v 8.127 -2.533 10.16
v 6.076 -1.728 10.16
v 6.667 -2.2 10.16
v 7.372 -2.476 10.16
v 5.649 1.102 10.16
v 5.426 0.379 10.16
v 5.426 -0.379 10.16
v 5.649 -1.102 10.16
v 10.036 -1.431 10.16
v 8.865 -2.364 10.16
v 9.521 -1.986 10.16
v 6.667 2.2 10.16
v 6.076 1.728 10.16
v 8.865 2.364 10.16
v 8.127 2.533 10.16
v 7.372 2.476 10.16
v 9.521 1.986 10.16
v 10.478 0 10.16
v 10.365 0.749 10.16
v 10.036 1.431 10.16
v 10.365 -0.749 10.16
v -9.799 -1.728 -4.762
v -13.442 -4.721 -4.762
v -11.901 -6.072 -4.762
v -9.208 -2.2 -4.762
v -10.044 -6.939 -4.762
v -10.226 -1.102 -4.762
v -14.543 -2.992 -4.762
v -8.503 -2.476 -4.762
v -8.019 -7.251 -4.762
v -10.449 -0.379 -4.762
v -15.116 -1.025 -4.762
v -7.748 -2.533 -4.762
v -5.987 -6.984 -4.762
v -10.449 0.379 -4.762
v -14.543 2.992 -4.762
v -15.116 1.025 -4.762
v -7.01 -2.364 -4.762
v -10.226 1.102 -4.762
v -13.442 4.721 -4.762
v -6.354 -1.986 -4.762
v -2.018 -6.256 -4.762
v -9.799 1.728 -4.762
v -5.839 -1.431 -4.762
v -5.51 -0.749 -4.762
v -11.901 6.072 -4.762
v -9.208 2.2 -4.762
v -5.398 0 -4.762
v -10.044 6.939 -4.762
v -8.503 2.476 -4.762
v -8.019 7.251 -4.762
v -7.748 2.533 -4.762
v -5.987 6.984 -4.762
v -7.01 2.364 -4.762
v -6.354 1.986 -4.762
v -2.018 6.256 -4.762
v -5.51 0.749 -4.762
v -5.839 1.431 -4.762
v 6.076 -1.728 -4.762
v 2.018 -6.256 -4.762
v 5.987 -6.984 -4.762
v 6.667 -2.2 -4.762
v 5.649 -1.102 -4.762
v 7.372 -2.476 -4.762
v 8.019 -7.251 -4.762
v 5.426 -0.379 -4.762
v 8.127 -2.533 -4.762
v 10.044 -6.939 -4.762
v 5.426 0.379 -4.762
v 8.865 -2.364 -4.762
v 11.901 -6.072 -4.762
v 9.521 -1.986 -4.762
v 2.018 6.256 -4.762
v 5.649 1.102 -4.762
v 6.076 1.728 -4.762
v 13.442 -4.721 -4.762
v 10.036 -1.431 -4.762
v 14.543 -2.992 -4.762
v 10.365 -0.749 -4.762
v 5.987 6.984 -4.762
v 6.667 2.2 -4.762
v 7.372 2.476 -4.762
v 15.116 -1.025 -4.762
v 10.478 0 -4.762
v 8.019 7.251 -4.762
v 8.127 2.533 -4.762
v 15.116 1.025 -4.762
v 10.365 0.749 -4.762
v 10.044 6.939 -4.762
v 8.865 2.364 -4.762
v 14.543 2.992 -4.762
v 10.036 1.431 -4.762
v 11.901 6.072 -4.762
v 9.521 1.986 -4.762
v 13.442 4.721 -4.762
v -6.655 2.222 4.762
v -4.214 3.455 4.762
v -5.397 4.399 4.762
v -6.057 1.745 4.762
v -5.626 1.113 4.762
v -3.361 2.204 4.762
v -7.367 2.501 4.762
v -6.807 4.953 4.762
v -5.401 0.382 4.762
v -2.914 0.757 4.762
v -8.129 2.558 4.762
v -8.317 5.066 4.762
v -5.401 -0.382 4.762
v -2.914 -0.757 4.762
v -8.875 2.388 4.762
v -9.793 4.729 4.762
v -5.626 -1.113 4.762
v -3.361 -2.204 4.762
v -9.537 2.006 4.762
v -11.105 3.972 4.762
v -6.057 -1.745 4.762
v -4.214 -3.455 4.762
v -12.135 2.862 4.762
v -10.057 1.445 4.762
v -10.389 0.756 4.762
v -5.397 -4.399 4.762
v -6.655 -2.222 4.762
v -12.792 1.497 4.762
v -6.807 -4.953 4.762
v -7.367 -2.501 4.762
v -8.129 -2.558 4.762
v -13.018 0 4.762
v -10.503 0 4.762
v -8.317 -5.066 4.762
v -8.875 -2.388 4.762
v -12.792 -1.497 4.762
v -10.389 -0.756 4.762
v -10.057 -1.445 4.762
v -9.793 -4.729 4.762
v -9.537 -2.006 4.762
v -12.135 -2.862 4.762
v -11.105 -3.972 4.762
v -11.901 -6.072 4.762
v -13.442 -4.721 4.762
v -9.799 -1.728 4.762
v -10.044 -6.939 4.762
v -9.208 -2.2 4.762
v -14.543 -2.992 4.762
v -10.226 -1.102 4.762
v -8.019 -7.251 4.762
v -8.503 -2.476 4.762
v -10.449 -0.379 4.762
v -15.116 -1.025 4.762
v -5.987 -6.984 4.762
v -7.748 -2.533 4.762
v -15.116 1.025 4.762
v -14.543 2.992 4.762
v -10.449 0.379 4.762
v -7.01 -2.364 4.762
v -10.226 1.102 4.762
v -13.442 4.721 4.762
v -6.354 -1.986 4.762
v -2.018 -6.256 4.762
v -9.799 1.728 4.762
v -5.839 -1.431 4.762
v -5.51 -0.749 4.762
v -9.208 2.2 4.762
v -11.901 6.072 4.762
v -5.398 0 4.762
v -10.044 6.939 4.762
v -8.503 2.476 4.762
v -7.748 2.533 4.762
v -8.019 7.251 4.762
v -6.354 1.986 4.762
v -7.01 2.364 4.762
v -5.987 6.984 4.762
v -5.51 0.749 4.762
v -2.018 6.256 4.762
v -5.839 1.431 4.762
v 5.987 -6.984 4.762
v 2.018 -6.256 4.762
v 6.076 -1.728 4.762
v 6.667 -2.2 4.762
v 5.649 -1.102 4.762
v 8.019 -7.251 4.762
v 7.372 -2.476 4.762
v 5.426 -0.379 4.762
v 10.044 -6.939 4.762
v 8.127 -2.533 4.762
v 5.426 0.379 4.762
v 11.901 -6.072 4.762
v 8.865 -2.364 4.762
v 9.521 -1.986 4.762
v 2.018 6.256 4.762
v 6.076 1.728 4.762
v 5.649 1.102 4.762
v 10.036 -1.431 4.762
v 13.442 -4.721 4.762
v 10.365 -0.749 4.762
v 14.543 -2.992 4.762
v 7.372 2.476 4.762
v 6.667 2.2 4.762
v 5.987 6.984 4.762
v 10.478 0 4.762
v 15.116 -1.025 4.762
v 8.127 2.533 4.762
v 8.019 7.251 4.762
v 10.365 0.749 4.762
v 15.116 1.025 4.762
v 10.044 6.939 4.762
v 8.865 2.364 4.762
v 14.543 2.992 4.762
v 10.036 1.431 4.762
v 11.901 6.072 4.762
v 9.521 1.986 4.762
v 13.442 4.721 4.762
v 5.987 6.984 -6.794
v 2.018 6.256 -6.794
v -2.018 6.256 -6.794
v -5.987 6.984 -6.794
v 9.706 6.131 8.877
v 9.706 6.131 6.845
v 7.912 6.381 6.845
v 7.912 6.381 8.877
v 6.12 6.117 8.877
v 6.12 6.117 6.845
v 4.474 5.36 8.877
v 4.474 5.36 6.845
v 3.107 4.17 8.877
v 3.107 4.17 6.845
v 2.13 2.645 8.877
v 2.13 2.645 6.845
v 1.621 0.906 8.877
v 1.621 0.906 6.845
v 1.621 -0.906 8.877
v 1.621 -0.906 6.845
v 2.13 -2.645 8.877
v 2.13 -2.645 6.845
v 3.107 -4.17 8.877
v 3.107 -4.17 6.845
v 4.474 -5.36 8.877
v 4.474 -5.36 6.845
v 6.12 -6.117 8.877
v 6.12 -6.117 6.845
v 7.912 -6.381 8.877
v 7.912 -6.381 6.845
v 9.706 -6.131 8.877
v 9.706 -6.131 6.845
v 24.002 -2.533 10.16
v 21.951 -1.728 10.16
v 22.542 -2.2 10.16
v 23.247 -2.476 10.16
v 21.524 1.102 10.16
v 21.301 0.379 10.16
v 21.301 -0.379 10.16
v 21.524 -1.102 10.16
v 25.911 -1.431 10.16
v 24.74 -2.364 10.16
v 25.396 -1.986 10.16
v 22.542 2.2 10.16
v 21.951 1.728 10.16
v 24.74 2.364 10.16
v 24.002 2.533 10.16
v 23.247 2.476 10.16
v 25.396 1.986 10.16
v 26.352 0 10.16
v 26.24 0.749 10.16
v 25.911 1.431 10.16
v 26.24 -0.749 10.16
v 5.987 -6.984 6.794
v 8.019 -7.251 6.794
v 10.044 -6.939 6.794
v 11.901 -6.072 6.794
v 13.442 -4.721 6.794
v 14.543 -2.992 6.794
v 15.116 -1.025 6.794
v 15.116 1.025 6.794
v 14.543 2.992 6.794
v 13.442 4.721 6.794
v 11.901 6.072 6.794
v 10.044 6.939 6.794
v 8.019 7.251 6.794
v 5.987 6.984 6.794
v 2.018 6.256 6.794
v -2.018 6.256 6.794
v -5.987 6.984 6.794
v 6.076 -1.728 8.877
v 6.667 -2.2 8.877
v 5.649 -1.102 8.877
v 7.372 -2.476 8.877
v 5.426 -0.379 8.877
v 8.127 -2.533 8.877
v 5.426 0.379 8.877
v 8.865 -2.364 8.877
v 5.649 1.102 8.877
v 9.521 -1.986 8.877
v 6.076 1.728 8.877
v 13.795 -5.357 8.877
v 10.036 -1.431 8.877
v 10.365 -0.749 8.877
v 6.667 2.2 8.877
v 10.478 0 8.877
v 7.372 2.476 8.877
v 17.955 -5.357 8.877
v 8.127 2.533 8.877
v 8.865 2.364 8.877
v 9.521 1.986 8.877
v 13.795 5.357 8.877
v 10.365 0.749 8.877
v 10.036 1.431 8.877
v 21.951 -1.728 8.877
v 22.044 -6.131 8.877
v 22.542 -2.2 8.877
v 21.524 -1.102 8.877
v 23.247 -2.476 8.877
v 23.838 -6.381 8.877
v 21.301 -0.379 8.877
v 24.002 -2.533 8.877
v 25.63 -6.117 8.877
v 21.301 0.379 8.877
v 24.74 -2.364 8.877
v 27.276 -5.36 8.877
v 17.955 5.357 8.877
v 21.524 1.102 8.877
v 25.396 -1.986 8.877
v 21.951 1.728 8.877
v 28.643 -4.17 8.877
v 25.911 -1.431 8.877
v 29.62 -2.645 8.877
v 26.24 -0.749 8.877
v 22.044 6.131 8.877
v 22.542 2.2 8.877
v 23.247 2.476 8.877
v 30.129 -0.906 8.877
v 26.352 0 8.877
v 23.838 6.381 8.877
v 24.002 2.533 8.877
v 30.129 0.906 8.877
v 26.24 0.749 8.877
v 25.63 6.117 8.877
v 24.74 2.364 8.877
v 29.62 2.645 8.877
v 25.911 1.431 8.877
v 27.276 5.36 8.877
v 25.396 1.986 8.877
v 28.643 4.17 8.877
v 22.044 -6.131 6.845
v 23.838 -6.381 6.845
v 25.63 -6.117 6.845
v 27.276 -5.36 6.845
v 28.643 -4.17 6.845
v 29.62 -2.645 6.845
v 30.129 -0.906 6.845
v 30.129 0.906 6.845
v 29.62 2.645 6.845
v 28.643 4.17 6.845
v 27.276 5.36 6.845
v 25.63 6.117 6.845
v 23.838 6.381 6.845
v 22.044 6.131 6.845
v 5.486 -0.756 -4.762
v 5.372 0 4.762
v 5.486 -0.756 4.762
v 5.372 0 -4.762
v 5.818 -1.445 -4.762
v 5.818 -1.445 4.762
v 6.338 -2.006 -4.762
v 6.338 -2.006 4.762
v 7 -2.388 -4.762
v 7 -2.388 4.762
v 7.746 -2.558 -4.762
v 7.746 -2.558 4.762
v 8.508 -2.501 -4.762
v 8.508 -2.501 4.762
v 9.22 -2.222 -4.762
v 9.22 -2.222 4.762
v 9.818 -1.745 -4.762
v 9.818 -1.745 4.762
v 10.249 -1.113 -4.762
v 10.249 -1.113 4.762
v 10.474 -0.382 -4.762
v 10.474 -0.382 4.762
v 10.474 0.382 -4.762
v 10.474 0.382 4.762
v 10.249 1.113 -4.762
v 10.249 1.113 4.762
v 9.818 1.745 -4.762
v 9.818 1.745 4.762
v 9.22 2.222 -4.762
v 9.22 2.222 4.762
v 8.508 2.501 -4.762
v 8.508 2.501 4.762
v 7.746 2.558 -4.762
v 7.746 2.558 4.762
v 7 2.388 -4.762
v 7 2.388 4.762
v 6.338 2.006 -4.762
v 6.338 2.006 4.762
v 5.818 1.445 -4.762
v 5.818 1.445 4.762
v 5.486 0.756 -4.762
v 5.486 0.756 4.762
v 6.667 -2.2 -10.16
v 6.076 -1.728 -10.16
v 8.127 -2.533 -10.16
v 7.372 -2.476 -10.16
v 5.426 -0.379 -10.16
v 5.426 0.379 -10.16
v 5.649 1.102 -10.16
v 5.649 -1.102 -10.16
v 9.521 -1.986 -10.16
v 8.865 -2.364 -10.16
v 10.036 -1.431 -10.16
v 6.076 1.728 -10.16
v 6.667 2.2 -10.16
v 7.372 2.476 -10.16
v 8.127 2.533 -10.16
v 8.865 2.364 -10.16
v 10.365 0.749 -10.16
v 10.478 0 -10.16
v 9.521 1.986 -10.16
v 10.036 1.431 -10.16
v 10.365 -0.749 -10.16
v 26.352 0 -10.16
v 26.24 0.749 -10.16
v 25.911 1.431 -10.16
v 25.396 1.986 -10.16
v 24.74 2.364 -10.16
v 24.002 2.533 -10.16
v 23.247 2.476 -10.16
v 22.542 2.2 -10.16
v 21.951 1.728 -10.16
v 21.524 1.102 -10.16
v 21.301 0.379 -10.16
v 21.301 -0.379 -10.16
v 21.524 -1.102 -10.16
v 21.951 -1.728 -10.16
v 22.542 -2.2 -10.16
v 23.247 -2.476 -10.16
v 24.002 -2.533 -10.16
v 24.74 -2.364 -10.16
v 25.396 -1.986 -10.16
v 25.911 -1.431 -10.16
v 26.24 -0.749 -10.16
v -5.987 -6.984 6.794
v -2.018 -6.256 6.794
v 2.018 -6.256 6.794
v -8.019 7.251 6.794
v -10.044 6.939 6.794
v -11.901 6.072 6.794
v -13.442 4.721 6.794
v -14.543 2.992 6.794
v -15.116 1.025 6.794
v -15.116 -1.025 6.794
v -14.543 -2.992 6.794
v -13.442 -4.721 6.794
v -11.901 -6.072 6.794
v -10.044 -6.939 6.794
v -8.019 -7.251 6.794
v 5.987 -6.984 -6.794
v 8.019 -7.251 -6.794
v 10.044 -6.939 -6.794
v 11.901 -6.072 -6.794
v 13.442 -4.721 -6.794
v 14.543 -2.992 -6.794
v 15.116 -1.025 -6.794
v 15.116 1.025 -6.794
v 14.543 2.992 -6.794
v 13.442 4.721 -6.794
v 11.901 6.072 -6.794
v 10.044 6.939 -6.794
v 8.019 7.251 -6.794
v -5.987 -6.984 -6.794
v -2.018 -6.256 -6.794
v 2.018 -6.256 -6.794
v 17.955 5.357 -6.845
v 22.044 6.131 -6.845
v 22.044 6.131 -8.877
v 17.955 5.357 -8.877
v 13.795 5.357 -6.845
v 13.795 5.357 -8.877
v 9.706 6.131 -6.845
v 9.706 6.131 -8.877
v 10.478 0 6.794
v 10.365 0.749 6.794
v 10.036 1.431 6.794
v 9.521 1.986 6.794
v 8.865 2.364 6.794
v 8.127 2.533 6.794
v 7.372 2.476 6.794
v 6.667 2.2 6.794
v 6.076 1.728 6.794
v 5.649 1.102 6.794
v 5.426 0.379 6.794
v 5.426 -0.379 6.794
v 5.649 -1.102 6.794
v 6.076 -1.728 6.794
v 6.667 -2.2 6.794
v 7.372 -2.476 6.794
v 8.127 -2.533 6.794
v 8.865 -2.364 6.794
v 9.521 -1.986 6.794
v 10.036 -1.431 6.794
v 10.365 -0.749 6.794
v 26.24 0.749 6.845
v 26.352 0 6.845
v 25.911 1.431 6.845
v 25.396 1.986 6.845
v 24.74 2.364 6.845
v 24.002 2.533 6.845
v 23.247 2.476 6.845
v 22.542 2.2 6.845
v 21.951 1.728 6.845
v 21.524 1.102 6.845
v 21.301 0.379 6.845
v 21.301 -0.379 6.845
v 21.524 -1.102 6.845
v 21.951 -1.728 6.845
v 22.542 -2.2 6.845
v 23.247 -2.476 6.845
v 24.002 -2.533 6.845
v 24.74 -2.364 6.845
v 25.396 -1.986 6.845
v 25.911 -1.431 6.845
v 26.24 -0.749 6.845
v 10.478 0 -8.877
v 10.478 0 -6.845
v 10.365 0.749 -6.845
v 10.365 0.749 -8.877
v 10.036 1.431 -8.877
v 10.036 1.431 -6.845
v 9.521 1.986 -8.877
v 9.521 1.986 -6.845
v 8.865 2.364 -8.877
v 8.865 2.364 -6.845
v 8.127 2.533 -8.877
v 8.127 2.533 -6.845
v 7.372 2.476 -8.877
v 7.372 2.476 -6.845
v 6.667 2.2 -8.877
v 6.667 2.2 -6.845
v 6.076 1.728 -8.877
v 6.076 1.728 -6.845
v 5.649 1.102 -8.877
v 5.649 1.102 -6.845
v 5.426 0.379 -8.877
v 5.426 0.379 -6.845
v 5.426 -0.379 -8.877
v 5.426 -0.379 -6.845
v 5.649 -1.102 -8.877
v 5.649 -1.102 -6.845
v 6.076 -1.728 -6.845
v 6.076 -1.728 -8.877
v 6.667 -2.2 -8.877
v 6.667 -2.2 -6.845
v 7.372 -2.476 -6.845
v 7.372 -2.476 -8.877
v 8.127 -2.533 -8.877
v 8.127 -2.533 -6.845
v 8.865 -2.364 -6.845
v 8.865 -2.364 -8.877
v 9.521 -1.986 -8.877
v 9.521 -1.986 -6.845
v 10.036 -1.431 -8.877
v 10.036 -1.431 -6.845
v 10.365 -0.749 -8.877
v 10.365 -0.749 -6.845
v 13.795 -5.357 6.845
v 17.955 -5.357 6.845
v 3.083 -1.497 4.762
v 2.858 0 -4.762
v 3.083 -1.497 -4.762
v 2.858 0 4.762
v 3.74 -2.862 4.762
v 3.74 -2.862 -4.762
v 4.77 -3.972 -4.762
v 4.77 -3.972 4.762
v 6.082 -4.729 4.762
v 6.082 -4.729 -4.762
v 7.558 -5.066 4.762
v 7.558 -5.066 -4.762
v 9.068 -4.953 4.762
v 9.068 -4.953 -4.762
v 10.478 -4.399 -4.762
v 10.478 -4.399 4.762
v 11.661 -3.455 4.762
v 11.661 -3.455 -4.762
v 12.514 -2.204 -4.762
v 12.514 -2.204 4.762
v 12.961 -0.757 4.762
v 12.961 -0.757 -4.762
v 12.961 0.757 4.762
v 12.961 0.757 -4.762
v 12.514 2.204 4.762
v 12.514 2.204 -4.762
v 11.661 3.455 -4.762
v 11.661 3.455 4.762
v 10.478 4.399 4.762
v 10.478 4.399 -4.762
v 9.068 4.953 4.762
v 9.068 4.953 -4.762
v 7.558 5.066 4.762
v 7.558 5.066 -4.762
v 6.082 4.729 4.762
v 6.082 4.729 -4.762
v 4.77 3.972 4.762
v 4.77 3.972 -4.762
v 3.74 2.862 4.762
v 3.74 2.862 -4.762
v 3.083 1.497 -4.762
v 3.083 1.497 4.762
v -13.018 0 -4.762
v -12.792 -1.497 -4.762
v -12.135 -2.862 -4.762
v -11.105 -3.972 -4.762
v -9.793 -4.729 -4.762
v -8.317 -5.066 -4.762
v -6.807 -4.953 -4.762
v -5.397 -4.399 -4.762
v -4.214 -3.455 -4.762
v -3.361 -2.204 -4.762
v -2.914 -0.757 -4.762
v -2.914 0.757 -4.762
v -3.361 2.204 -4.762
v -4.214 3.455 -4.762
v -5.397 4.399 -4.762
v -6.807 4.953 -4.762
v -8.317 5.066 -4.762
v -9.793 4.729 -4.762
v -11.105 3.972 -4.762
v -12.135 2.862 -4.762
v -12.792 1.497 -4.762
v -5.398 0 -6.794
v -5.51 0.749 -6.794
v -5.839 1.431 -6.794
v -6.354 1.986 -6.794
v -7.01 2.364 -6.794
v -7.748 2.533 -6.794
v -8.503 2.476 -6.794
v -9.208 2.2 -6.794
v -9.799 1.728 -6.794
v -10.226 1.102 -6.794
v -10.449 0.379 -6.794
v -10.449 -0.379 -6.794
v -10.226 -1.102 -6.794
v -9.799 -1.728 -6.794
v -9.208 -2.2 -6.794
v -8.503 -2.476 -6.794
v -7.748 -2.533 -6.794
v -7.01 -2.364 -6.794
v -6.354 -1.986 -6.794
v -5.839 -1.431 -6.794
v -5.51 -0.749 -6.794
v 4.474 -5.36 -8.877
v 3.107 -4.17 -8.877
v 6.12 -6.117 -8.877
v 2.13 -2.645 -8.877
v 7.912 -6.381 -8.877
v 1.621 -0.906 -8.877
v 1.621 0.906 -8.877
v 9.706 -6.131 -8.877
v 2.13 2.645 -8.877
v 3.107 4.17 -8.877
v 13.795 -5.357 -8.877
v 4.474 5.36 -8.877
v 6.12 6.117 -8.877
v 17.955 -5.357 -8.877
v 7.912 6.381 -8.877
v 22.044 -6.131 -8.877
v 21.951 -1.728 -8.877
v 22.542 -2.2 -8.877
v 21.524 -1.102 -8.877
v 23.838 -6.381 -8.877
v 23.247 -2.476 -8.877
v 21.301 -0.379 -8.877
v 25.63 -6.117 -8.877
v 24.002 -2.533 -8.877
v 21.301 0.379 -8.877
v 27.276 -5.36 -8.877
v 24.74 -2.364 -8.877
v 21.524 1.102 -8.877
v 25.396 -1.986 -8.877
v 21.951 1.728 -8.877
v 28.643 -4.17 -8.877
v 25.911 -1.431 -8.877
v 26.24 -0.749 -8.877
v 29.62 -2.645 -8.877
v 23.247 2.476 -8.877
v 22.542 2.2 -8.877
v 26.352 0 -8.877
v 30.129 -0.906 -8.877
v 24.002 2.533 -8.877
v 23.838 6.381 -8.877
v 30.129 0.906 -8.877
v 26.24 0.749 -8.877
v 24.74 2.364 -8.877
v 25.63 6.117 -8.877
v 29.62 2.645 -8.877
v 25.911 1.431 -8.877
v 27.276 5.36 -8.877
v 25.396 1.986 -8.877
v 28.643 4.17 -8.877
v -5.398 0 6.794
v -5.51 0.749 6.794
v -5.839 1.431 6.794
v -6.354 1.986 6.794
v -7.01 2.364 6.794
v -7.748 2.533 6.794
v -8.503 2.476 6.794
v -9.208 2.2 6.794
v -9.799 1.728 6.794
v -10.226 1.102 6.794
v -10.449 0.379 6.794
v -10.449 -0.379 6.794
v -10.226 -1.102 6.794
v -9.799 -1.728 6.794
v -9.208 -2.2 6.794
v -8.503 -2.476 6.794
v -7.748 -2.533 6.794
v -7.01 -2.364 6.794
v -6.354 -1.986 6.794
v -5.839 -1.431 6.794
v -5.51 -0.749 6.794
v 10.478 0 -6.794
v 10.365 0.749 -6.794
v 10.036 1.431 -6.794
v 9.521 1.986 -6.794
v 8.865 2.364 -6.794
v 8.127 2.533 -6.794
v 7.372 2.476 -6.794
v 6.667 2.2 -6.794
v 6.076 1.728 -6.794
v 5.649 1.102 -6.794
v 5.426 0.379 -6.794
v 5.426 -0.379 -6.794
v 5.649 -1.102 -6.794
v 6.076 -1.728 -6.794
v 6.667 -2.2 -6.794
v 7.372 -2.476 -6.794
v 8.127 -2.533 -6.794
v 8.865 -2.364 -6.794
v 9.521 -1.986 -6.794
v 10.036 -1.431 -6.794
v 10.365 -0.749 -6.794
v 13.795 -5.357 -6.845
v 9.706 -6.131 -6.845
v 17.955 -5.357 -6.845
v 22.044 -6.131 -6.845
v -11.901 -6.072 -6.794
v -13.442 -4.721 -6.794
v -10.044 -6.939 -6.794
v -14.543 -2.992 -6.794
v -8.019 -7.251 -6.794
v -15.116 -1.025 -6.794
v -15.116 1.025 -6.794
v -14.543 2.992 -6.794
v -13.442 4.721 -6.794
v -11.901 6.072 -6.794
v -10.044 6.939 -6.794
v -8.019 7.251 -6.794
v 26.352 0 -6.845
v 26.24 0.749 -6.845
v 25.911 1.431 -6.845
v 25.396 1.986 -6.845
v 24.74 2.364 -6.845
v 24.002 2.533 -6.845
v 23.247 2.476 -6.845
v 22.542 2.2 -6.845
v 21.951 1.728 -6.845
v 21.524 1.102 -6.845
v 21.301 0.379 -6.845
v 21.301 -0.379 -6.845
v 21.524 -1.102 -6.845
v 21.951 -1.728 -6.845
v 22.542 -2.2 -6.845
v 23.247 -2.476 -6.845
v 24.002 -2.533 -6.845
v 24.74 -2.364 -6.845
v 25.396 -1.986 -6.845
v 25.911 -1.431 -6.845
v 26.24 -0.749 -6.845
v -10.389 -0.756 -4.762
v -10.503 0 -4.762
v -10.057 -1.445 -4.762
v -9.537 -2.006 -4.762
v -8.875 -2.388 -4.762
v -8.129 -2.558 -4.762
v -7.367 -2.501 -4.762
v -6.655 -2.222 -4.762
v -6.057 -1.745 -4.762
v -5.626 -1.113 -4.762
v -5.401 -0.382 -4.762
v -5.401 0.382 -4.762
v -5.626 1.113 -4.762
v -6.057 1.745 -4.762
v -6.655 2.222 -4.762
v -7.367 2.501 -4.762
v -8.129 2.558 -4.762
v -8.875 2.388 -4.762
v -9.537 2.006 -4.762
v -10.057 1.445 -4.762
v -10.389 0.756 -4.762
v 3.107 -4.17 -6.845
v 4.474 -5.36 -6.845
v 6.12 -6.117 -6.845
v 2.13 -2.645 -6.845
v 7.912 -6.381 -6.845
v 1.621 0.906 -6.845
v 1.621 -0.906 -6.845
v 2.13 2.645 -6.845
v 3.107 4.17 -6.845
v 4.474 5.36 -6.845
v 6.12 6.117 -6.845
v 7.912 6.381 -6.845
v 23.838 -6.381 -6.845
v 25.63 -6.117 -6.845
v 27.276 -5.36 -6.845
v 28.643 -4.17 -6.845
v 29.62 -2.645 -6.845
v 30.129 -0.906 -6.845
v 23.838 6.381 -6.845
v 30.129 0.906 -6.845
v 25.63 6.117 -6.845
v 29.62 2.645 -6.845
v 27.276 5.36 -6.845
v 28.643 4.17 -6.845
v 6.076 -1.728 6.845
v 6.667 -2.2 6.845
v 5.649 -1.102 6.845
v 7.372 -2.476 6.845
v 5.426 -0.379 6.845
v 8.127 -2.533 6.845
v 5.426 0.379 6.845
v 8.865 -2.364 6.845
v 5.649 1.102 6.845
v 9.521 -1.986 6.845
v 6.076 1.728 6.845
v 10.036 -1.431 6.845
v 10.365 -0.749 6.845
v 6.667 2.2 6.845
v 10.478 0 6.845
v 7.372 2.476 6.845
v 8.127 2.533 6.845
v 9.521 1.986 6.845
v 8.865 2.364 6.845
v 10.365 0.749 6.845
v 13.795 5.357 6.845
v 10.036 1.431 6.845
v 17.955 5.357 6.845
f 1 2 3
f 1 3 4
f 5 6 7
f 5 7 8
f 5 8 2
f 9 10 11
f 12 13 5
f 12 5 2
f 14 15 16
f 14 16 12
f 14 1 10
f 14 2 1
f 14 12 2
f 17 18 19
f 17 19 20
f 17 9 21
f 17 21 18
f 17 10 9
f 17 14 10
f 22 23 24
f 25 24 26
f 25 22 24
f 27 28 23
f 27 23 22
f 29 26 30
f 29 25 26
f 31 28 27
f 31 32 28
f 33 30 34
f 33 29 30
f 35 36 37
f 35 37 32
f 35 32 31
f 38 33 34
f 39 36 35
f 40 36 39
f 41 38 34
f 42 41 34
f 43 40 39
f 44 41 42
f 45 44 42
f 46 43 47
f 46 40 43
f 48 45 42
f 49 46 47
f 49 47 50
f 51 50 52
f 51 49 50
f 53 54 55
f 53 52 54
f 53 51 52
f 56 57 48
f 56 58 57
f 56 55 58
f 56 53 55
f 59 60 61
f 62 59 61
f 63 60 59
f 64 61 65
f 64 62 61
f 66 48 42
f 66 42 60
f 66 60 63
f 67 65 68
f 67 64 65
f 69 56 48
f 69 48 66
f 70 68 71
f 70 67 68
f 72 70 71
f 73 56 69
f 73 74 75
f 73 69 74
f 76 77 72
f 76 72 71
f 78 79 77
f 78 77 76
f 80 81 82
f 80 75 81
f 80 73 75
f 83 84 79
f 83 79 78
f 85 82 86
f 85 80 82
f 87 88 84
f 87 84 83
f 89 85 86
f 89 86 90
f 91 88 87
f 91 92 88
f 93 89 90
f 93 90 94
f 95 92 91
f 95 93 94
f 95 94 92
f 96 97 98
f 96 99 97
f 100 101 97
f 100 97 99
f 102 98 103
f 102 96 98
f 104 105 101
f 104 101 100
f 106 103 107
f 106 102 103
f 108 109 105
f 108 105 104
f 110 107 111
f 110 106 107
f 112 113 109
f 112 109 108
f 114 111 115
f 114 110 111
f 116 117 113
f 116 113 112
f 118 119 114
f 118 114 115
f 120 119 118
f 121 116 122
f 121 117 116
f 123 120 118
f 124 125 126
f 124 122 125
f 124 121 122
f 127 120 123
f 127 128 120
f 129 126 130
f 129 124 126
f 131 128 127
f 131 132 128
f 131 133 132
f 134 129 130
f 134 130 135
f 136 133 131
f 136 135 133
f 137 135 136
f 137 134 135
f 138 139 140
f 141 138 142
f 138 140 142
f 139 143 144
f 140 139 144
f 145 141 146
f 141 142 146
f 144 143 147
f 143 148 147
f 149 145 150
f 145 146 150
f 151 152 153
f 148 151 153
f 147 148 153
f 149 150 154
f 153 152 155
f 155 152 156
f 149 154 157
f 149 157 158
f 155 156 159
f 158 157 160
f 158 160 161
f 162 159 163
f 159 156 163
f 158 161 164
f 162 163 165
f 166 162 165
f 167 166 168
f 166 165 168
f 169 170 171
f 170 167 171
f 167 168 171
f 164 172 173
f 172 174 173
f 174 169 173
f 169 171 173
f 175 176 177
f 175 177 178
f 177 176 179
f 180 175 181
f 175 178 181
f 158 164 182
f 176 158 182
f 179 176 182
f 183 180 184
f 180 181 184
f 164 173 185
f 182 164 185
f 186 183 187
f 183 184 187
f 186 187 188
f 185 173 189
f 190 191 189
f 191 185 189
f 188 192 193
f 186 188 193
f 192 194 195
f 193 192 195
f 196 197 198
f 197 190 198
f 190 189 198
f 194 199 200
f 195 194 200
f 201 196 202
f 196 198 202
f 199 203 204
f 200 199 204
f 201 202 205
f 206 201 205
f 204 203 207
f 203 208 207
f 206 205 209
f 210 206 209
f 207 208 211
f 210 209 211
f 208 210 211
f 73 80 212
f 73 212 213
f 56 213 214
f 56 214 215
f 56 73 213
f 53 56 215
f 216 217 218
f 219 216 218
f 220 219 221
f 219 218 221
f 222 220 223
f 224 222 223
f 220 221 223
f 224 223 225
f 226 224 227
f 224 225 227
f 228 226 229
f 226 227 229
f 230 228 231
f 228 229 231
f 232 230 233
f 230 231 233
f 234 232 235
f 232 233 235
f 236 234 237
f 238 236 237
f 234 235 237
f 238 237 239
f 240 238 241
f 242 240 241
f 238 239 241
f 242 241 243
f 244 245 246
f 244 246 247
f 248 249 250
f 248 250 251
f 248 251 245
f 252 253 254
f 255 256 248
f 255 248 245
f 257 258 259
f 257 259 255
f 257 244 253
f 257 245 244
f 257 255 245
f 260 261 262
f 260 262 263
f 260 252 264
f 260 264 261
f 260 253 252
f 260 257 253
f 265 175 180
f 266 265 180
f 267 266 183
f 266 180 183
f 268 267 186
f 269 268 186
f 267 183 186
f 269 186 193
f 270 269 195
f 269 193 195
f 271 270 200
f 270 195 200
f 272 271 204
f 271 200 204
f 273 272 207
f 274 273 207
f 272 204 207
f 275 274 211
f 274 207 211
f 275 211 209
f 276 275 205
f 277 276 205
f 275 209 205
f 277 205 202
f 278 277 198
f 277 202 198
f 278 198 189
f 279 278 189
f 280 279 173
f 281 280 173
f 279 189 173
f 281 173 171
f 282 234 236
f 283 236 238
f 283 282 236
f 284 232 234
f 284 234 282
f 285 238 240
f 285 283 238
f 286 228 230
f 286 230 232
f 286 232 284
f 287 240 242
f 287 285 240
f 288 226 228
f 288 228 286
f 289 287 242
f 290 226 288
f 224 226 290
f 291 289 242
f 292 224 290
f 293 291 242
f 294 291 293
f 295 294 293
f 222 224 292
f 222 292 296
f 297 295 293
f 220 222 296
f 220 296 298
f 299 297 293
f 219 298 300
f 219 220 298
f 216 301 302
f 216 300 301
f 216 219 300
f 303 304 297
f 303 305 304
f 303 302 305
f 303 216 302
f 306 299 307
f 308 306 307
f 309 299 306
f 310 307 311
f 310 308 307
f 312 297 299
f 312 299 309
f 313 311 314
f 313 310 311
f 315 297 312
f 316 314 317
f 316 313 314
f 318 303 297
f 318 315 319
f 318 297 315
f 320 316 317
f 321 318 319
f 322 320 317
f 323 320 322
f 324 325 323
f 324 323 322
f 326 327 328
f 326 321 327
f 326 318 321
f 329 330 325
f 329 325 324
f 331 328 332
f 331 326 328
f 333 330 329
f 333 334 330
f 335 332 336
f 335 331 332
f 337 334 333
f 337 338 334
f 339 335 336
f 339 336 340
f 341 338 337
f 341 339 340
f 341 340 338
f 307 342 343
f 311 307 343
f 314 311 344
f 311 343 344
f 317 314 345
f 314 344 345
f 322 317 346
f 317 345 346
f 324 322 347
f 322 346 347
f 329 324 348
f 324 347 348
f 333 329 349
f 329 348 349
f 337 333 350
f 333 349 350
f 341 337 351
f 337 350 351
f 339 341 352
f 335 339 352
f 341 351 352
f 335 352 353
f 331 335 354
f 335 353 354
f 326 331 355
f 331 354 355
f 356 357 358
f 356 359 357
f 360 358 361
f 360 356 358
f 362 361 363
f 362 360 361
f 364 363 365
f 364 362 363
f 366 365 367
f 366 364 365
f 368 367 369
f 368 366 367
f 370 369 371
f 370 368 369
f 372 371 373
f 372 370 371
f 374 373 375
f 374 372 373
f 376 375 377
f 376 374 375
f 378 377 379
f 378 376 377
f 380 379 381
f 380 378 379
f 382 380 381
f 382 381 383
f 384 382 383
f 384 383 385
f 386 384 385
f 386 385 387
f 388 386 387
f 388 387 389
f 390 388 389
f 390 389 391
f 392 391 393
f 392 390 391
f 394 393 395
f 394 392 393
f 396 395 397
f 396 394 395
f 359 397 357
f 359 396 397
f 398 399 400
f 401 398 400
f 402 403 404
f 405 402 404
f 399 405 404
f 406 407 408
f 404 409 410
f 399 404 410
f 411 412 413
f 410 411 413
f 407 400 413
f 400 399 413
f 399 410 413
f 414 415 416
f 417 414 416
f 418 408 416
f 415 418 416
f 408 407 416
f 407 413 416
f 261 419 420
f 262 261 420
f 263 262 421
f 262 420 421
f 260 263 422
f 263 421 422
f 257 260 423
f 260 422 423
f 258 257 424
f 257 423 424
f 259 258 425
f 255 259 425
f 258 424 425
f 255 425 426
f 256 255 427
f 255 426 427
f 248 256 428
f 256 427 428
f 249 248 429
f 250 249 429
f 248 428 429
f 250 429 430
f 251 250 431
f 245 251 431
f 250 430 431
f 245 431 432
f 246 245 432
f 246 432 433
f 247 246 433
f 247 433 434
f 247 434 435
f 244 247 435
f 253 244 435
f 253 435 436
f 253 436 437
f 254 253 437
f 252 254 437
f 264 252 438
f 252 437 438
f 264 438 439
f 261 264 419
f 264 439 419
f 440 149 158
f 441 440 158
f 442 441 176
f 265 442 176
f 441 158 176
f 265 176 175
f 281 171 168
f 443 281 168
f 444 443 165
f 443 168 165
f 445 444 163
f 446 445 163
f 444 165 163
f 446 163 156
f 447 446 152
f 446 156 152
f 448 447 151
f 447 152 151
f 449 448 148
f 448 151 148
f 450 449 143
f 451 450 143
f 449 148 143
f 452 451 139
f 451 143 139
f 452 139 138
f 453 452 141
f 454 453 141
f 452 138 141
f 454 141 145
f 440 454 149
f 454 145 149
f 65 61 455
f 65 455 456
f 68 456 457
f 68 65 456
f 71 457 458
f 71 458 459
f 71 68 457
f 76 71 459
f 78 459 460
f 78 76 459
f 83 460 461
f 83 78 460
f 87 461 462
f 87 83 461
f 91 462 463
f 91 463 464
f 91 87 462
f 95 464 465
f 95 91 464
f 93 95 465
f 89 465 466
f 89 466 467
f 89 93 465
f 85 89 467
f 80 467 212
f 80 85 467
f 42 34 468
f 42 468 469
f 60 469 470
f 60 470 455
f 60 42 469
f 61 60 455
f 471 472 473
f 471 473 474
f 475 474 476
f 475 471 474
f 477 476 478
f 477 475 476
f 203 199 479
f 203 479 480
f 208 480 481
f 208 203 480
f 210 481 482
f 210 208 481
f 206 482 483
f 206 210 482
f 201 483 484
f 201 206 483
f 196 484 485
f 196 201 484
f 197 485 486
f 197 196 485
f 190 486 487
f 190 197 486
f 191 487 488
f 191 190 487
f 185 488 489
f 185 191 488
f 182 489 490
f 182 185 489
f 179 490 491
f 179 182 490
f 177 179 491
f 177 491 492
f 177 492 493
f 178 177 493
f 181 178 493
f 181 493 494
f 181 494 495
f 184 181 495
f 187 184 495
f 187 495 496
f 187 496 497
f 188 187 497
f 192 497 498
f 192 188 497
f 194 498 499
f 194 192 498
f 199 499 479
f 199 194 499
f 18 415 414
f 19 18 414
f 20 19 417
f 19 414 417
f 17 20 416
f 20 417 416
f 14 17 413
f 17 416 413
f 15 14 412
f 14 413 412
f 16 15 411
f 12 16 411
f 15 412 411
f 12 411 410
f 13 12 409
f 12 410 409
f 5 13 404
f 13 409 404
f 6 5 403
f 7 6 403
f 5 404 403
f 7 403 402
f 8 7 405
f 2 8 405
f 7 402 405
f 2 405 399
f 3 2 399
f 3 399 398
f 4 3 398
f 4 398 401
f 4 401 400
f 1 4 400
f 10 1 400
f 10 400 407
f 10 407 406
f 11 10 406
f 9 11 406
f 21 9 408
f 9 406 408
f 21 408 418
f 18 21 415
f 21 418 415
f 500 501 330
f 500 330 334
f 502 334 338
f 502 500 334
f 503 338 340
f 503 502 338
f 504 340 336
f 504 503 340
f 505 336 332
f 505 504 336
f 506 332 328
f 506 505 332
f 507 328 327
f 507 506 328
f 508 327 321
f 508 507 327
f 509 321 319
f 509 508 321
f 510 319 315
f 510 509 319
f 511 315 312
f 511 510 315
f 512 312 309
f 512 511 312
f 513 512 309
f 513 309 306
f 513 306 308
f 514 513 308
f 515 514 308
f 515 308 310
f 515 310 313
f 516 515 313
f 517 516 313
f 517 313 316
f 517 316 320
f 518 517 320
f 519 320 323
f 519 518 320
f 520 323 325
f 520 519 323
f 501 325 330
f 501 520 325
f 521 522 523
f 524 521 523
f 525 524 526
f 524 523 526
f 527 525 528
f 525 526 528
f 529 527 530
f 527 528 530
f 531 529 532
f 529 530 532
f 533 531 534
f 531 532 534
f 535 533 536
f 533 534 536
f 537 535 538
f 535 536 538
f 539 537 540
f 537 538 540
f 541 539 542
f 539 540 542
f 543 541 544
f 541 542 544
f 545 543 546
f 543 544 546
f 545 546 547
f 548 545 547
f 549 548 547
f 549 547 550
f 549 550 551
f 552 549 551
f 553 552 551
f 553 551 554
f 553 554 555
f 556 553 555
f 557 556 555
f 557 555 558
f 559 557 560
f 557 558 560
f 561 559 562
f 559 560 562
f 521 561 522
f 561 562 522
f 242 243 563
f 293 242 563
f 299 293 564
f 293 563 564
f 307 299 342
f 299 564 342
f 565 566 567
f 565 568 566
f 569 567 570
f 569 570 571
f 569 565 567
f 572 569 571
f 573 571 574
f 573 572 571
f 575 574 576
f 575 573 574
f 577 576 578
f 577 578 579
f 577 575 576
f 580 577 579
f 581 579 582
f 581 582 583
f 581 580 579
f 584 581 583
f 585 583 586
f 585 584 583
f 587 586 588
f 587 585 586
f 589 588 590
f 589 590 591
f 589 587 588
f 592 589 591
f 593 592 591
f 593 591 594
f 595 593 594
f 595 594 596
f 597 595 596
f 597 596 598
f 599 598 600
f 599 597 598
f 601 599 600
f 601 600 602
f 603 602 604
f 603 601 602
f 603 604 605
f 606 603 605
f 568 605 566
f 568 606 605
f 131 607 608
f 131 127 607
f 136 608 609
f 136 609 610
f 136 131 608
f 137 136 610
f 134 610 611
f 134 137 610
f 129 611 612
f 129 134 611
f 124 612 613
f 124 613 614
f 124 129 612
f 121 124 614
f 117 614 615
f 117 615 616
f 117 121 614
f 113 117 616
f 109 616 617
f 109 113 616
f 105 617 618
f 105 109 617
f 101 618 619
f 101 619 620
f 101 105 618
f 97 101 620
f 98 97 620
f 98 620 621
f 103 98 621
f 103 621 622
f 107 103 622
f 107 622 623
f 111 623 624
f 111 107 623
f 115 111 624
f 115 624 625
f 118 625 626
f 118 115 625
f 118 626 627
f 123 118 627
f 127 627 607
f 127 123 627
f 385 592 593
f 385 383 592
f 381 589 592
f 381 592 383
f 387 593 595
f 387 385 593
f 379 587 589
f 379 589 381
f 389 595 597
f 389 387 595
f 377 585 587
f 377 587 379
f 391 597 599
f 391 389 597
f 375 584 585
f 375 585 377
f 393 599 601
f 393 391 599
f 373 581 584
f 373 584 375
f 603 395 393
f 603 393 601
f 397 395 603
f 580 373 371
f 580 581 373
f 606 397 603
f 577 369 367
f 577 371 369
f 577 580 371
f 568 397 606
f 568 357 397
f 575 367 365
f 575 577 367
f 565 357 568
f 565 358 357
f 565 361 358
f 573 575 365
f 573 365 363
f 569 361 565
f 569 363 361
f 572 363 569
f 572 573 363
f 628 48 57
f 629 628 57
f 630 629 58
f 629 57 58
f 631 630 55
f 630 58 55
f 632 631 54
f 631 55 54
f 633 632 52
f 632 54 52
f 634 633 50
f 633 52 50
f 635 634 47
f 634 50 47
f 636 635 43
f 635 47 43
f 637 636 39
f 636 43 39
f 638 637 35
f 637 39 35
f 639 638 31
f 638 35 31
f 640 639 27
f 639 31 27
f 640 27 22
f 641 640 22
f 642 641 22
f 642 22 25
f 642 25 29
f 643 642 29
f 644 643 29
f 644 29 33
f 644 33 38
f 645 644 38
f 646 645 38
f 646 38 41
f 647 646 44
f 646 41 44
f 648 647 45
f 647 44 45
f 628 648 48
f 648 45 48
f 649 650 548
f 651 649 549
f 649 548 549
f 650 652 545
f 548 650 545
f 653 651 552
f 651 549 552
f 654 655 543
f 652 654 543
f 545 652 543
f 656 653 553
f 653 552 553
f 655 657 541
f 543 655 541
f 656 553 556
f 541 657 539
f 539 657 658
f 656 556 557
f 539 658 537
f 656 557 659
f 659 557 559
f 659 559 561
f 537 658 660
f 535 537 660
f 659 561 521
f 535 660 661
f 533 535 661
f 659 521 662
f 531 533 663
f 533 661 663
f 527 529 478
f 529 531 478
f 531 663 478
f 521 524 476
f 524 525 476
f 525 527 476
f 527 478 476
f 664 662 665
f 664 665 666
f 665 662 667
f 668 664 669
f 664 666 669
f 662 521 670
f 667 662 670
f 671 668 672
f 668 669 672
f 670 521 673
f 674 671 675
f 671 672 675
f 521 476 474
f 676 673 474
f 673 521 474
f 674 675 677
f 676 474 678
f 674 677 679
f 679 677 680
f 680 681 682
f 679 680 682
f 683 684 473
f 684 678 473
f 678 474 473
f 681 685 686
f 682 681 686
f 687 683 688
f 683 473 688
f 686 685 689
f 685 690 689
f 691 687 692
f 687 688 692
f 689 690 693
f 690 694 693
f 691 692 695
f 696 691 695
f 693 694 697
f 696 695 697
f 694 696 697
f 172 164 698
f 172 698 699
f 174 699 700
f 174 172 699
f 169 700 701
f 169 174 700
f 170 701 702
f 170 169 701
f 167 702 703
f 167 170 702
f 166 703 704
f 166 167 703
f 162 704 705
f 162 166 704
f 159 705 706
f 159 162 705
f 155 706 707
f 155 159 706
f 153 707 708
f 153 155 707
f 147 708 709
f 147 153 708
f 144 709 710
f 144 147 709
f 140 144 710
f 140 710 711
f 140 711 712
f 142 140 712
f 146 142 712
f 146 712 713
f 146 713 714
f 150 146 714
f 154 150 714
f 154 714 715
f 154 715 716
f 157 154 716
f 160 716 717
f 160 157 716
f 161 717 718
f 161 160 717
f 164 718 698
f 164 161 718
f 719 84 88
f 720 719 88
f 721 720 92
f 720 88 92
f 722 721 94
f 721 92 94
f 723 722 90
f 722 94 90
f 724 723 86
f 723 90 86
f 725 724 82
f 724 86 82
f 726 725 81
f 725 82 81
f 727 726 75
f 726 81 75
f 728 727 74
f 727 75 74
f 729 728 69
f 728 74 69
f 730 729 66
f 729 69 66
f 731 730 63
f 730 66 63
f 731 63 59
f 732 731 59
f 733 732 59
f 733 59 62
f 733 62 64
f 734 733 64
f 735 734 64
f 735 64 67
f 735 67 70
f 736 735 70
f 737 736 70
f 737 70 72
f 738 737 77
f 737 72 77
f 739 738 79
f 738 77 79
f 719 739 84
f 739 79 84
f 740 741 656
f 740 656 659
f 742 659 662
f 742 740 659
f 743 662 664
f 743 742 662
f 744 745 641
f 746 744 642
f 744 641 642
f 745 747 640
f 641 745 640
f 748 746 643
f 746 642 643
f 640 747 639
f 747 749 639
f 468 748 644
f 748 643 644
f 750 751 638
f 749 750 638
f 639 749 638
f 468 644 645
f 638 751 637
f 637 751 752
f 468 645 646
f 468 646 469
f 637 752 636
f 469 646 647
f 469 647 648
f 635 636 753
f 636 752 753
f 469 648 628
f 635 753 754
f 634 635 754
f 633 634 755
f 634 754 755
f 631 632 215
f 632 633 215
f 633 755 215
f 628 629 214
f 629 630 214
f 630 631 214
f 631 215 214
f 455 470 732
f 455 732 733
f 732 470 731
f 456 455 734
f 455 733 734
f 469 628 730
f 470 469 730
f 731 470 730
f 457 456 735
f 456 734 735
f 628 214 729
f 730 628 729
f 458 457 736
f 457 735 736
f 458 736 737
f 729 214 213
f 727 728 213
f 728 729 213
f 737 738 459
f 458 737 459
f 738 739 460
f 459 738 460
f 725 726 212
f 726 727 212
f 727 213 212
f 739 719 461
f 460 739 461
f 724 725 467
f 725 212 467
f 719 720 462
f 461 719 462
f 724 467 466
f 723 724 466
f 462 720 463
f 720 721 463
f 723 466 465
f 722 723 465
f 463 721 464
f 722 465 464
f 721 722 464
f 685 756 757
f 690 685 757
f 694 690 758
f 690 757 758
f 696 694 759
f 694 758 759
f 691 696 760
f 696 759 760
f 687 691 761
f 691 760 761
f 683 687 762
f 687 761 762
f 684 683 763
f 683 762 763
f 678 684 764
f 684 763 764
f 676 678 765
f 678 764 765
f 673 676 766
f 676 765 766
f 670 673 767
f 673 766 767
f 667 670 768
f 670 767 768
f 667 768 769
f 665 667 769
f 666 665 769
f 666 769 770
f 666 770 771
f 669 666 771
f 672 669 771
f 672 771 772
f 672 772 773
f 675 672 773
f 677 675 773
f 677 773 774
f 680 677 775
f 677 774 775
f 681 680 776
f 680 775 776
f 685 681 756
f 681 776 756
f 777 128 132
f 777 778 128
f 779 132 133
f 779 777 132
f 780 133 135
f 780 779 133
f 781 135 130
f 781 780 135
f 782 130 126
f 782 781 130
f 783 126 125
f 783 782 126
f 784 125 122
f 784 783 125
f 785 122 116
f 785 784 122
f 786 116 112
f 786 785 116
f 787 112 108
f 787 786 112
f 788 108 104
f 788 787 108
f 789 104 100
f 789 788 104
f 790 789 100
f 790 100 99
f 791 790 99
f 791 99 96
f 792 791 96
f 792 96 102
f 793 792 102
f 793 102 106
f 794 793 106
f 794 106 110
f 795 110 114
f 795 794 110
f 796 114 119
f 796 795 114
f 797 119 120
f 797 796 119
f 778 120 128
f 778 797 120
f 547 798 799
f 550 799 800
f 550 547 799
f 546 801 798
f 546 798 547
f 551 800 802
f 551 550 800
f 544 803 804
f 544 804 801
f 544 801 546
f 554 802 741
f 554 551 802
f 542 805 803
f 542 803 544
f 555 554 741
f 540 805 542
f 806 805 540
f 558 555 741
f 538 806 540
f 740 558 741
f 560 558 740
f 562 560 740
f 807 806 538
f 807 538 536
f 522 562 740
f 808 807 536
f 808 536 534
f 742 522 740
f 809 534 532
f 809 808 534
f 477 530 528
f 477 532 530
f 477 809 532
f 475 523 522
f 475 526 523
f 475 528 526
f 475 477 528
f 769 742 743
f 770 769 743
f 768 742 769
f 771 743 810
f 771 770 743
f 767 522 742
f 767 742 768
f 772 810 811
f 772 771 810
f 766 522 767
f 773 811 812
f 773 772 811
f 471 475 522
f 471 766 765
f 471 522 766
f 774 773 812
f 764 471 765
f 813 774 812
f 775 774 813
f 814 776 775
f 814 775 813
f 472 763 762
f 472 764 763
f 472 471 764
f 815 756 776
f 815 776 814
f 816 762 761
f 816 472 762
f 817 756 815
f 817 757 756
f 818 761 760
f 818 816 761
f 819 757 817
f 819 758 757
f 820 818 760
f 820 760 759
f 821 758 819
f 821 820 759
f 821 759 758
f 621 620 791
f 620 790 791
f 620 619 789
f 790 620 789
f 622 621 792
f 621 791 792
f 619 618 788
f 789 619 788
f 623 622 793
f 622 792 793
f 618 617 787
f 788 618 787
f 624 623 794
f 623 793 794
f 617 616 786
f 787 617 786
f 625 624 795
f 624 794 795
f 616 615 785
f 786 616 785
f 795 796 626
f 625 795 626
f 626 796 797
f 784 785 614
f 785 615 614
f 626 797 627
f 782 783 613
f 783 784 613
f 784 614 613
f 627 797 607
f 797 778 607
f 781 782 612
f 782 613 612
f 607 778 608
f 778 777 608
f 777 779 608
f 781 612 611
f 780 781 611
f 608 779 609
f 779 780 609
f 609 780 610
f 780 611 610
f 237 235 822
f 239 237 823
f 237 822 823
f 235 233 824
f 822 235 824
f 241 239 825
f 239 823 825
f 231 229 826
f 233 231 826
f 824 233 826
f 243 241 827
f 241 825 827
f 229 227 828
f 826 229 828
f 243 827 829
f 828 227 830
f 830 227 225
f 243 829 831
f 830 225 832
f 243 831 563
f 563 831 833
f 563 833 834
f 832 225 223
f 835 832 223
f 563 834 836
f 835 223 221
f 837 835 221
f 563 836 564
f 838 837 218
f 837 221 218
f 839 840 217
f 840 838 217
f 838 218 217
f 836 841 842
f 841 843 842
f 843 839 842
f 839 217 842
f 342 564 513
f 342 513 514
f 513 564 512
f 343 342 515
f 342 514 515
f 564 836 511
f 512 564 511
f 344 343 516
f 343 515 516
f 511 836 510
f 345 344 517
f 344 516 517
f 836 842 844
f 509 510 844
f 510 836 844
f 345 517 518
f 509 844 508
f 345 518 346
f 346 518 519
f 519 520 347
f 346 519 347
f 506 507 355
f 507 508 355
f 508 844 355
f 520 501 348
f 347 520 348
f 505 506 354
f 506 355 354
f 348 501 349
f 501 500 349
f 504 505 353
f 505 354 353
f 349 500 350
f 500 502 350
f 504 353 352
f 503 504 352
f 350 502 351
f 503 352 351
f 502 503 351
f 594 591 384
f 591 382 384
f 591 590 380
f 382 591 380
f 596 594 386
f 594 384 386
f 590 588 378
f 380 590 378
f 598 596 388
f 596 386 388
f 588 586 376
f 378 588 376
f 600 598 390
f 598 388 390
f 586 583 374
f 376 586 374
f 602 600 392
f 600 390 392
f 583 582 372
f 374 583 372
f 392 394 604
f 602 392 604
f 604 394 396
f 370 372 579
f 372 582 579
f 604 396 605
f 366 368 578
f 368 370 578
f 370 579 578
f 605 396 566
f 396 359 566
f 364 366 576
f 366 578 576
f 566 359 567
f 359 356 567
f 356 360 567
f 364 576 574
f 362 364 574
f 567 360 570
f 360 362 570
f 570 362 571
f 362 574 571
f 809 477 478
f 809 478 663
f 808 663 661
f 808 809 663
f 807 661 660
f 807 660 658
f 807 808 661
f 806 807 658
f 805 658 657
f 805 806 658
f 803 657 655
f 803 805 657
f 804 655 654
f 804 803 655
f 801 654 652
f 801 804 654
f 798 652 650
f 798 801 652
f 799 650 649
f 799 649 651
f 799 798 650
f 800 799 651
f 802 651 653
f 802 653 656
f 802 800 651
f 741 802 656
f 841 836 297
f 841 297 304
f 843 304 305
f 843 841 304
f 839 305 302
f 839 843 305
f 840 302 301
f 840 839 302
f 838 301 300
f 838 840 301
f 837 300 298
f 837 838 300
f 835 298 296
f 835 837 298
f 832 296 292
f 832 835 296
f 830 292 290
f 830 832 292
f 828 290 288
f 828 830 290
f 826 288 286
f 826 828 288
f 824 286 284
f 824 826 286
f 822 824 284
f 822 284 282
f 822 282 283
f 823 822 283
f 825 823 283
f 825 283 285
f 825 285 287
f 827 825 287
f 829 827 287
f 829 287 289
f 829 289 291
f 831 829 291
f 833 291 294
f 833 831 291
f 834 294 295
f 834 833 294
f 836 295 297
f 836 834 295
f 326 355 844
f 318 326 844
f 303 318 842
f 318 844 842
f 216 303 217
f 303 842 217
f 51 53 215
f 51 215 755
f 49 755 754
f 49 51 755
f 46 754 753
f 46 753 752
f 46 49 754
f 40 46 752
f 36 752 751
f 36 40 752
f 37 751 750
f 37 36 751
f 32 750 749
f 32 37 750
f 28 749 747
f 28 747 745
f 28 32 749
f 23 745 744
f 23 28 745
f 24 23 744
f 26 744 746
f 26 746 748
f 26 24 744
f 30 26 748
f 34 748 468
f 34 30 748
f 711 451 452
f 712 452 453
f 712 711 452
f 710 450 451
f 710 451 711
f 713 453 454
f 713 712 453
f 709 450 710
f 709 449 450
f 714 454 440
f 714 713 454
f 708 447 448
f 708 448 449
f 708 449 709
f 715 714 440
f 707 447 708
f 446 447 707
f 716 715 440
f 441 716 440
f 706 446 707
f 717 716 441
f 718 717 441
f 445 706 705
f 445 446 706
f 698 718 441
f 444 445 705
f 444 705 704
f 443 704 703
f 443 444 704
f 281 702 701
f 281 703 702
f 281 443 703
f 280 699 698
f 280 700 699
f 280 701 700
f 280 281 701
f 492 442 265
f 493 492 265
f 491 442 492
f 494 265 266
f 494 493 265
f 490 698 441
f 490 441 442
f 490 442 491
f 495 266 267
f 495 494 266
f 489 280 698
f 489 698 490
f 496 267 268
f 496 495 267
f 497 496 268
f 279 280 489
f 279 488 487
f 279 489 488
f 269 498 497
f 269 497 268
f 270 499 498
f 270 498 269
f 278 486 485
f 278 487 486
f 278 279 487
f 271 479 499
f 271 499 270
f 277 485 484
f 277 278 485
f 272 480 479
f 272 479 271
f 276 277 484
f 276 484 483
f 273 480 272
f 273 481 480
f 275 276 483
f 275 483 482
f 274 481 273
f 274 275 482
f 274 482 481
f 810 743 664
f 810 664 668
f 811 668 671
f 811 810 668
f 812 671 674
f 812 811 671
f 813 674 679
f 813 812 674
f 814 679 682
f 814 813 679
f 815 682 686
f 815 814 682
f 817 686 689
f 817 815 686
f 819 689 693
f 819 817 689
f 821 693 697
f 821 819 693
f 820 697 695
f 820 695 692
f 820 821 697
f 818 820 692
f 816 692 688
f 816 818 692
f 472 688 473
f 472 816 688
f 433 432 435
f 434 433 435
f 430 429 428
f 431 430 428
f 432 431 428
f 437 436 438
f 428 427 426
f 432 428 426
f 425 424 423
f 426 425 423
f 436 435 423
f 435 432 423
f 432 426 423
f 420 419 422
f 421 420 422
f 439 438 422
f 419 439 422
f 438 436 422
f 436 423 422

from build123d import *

# Parameters (mm, degrees)
SKETCH4_R                  = 5.08
SKETCH4_R_2                = 2.5654
BOSS_EXTRUDE1_DEPTH        = 4.7625
BOSS_EXTRUDE1_2_DEPTH      = 4.7625
SKETCH5_R                  = 2.54
BOSS_EXTRUDE2_DEPTH        = 2.032
LPATTERN1_COUNT            = 2
LPATTERN1_PITCH            = 15.875
SKETCH7_R                  = 2.54
BOSS_EXTRUDE3_DEPTH        = 2.032
BOSS_EXTRUDE4_DEPTH        = 10.16
BOSS_EXTRUDE4_DEPTH_BACK   = 10.16
SKETCH8_R                  = 2.54
BOSS_EXTRUDE4_2_DEPTH      = 10.16
BOSS_EXTRUDE4_2_DEPTH_BACK = 10.16


with BuildPart() as part:
    # Sketch4 → Boss-Extrude1 (new, symmetric)
    with BuildSketch(Plane.XY):
        with Locations(Location((-7.9375, 0, 0), (0, 0, 180))):
            Circle(SKETCH4_R)
        with Locations(Location((-7.9375, 0, 0), (0, 0, 180))):
            Circle(SKETCH4_R_2, mode=Mode.SUBTRACT)
    extrude(amount=BOSS_EXTRUDE1_DEPTH, both=True)


with BuildPart() as body_2:
    # Sketch4 → Boss-Extrude1 2 (new, symmetric)
    with BuildSketch(Plane.XY):
        with Locations(Location((7.9375, 0, 0), (0, 0, 180))):
            Circle(SKETCH4_R)
        with Locations(Location((7.9375, 0, 0), (0, 0, 180))):
            Circle(SKETCH4_R_2, mode=Mode.SUBTRACT)
    extrude(amount=BOSS_EXTRUDE1_2_DEPTH, both=True)


with BuildPart() as body_3:
    # Sketch5 → Boss-Extrude2 (new body)
    with BuildSketch(Plane.XY.offset(4.7625)):
        with BuildLine():
            ThreePointArc((-5.986592041, 6.984347573), (-15.1892, 0), (-5.986592041, -6.984347573))
            ThreePointArc((-5.986592041, -6.984347573), (0, -6.163945), (5.986592041, -6.984347573))
            ThreePointArc((5.986592041, -6.984347573), (15.1892, 0), (5.986592041, 6.984347573))
            ThreePointArc((5.986592041, 6.984347573), (0, 6.163945), (-5.986592041, 6.984347573))
        make_face()
        with Locations((-7.9375, 0)):
            Circle(SKETCH5_R, mode=Mode.SUBTRACT)
        with Locations((7.9375, 0)):
            Circle(SKETCH5_R, mode=Mode.SUBTRACT)
    extrude(amount=BOSS_EXTRUDE2_DEPTH)


with BuildPart() as lpattern1_1:
    # LPattern1: pattern copy
    add(body_2.part.moved(Location(Vector(1, 0, 0) * (1 * LPATTERN1_PITCH))))


with BuildPart() as body_5:
    # Sketch7 → Boss-Extrude3 (new body)
    with BuildSketch(Plane.XY.offset(-6.8453)):
        with BuildLine():
            ThreePointArc((9.706473173, 6.131412978), (1.556004, 0), (9.706473173, -6.131412978))
            ThreePointArc((9.706473173, -6.131412978), (15.875, -5.259356889), (22.043526827, -6.131412978))
            ThreePointArc((22.043526827, -6.131412978), (30.193996, 0), (22.043526827, 6.131412978))
            ThreePointArc((22.043526827, 6.131412978), (15.875, 5.259356889), (9.706473173, 6.131412978))
        make_face()
        with Locations((7.9375, 0)):
            Circle(SKETCH7_R, mode=Mode.SUBTRACT)
        with Locations((23.8125, 0)):
            Circle(SKETCH7_R, mode=Mode.SUBTRACT)
    extrude(amount=-BOSS_EXTRUDE3_DEPTH)


with BuildPart() as body_6:
    # Mirror1: mirrored copy
    add(body_3.part.mirror(Plane.XY))


with BuildPart() as body_7:
    # Mirror1 2: mirrored copy
    add(body_5.part.mirror(Plane.XY))


with BuildPart() as body_8:
    # Sketch8 → Boss-Extrude4 (new, two sides: drawn at the far end of the back side and taken through both)
    with BuildSketch(Plane.XY.offset(-BOSS_EXTRUDE4_DEPTH_BACK)):
        with Locations((7.9375, 0)):
            Circle(SKETCH8_R)
    extrude(amount=BOSS_EXTRUDE4_DEPTH + BOSS_EXTRUDE4_DEPTH_BACK)


with BuildPart() as body_9:
    # Sketch8 → Boss-Extrude4 2 (new, two sides: drawn at the far end of the back side and taken through both)
    with BuildSketch(Plane.XY.offset(-BOSS_EXTRUDE4_2_DEPTH_BACK)):
        with Locations((23.8125, 0)):
            Circle(SKETCH8_R)
    extrude(amount=BOSS_EXTRUDE4_2_DEPTH + BOSS_EXTRUDE4_2_DEPTH_BACK)


solid = Compound([part.part, body_2.part, body_3.part, body_5.part, body_6.part, body_7.part, body_8.part, body_9.part])
